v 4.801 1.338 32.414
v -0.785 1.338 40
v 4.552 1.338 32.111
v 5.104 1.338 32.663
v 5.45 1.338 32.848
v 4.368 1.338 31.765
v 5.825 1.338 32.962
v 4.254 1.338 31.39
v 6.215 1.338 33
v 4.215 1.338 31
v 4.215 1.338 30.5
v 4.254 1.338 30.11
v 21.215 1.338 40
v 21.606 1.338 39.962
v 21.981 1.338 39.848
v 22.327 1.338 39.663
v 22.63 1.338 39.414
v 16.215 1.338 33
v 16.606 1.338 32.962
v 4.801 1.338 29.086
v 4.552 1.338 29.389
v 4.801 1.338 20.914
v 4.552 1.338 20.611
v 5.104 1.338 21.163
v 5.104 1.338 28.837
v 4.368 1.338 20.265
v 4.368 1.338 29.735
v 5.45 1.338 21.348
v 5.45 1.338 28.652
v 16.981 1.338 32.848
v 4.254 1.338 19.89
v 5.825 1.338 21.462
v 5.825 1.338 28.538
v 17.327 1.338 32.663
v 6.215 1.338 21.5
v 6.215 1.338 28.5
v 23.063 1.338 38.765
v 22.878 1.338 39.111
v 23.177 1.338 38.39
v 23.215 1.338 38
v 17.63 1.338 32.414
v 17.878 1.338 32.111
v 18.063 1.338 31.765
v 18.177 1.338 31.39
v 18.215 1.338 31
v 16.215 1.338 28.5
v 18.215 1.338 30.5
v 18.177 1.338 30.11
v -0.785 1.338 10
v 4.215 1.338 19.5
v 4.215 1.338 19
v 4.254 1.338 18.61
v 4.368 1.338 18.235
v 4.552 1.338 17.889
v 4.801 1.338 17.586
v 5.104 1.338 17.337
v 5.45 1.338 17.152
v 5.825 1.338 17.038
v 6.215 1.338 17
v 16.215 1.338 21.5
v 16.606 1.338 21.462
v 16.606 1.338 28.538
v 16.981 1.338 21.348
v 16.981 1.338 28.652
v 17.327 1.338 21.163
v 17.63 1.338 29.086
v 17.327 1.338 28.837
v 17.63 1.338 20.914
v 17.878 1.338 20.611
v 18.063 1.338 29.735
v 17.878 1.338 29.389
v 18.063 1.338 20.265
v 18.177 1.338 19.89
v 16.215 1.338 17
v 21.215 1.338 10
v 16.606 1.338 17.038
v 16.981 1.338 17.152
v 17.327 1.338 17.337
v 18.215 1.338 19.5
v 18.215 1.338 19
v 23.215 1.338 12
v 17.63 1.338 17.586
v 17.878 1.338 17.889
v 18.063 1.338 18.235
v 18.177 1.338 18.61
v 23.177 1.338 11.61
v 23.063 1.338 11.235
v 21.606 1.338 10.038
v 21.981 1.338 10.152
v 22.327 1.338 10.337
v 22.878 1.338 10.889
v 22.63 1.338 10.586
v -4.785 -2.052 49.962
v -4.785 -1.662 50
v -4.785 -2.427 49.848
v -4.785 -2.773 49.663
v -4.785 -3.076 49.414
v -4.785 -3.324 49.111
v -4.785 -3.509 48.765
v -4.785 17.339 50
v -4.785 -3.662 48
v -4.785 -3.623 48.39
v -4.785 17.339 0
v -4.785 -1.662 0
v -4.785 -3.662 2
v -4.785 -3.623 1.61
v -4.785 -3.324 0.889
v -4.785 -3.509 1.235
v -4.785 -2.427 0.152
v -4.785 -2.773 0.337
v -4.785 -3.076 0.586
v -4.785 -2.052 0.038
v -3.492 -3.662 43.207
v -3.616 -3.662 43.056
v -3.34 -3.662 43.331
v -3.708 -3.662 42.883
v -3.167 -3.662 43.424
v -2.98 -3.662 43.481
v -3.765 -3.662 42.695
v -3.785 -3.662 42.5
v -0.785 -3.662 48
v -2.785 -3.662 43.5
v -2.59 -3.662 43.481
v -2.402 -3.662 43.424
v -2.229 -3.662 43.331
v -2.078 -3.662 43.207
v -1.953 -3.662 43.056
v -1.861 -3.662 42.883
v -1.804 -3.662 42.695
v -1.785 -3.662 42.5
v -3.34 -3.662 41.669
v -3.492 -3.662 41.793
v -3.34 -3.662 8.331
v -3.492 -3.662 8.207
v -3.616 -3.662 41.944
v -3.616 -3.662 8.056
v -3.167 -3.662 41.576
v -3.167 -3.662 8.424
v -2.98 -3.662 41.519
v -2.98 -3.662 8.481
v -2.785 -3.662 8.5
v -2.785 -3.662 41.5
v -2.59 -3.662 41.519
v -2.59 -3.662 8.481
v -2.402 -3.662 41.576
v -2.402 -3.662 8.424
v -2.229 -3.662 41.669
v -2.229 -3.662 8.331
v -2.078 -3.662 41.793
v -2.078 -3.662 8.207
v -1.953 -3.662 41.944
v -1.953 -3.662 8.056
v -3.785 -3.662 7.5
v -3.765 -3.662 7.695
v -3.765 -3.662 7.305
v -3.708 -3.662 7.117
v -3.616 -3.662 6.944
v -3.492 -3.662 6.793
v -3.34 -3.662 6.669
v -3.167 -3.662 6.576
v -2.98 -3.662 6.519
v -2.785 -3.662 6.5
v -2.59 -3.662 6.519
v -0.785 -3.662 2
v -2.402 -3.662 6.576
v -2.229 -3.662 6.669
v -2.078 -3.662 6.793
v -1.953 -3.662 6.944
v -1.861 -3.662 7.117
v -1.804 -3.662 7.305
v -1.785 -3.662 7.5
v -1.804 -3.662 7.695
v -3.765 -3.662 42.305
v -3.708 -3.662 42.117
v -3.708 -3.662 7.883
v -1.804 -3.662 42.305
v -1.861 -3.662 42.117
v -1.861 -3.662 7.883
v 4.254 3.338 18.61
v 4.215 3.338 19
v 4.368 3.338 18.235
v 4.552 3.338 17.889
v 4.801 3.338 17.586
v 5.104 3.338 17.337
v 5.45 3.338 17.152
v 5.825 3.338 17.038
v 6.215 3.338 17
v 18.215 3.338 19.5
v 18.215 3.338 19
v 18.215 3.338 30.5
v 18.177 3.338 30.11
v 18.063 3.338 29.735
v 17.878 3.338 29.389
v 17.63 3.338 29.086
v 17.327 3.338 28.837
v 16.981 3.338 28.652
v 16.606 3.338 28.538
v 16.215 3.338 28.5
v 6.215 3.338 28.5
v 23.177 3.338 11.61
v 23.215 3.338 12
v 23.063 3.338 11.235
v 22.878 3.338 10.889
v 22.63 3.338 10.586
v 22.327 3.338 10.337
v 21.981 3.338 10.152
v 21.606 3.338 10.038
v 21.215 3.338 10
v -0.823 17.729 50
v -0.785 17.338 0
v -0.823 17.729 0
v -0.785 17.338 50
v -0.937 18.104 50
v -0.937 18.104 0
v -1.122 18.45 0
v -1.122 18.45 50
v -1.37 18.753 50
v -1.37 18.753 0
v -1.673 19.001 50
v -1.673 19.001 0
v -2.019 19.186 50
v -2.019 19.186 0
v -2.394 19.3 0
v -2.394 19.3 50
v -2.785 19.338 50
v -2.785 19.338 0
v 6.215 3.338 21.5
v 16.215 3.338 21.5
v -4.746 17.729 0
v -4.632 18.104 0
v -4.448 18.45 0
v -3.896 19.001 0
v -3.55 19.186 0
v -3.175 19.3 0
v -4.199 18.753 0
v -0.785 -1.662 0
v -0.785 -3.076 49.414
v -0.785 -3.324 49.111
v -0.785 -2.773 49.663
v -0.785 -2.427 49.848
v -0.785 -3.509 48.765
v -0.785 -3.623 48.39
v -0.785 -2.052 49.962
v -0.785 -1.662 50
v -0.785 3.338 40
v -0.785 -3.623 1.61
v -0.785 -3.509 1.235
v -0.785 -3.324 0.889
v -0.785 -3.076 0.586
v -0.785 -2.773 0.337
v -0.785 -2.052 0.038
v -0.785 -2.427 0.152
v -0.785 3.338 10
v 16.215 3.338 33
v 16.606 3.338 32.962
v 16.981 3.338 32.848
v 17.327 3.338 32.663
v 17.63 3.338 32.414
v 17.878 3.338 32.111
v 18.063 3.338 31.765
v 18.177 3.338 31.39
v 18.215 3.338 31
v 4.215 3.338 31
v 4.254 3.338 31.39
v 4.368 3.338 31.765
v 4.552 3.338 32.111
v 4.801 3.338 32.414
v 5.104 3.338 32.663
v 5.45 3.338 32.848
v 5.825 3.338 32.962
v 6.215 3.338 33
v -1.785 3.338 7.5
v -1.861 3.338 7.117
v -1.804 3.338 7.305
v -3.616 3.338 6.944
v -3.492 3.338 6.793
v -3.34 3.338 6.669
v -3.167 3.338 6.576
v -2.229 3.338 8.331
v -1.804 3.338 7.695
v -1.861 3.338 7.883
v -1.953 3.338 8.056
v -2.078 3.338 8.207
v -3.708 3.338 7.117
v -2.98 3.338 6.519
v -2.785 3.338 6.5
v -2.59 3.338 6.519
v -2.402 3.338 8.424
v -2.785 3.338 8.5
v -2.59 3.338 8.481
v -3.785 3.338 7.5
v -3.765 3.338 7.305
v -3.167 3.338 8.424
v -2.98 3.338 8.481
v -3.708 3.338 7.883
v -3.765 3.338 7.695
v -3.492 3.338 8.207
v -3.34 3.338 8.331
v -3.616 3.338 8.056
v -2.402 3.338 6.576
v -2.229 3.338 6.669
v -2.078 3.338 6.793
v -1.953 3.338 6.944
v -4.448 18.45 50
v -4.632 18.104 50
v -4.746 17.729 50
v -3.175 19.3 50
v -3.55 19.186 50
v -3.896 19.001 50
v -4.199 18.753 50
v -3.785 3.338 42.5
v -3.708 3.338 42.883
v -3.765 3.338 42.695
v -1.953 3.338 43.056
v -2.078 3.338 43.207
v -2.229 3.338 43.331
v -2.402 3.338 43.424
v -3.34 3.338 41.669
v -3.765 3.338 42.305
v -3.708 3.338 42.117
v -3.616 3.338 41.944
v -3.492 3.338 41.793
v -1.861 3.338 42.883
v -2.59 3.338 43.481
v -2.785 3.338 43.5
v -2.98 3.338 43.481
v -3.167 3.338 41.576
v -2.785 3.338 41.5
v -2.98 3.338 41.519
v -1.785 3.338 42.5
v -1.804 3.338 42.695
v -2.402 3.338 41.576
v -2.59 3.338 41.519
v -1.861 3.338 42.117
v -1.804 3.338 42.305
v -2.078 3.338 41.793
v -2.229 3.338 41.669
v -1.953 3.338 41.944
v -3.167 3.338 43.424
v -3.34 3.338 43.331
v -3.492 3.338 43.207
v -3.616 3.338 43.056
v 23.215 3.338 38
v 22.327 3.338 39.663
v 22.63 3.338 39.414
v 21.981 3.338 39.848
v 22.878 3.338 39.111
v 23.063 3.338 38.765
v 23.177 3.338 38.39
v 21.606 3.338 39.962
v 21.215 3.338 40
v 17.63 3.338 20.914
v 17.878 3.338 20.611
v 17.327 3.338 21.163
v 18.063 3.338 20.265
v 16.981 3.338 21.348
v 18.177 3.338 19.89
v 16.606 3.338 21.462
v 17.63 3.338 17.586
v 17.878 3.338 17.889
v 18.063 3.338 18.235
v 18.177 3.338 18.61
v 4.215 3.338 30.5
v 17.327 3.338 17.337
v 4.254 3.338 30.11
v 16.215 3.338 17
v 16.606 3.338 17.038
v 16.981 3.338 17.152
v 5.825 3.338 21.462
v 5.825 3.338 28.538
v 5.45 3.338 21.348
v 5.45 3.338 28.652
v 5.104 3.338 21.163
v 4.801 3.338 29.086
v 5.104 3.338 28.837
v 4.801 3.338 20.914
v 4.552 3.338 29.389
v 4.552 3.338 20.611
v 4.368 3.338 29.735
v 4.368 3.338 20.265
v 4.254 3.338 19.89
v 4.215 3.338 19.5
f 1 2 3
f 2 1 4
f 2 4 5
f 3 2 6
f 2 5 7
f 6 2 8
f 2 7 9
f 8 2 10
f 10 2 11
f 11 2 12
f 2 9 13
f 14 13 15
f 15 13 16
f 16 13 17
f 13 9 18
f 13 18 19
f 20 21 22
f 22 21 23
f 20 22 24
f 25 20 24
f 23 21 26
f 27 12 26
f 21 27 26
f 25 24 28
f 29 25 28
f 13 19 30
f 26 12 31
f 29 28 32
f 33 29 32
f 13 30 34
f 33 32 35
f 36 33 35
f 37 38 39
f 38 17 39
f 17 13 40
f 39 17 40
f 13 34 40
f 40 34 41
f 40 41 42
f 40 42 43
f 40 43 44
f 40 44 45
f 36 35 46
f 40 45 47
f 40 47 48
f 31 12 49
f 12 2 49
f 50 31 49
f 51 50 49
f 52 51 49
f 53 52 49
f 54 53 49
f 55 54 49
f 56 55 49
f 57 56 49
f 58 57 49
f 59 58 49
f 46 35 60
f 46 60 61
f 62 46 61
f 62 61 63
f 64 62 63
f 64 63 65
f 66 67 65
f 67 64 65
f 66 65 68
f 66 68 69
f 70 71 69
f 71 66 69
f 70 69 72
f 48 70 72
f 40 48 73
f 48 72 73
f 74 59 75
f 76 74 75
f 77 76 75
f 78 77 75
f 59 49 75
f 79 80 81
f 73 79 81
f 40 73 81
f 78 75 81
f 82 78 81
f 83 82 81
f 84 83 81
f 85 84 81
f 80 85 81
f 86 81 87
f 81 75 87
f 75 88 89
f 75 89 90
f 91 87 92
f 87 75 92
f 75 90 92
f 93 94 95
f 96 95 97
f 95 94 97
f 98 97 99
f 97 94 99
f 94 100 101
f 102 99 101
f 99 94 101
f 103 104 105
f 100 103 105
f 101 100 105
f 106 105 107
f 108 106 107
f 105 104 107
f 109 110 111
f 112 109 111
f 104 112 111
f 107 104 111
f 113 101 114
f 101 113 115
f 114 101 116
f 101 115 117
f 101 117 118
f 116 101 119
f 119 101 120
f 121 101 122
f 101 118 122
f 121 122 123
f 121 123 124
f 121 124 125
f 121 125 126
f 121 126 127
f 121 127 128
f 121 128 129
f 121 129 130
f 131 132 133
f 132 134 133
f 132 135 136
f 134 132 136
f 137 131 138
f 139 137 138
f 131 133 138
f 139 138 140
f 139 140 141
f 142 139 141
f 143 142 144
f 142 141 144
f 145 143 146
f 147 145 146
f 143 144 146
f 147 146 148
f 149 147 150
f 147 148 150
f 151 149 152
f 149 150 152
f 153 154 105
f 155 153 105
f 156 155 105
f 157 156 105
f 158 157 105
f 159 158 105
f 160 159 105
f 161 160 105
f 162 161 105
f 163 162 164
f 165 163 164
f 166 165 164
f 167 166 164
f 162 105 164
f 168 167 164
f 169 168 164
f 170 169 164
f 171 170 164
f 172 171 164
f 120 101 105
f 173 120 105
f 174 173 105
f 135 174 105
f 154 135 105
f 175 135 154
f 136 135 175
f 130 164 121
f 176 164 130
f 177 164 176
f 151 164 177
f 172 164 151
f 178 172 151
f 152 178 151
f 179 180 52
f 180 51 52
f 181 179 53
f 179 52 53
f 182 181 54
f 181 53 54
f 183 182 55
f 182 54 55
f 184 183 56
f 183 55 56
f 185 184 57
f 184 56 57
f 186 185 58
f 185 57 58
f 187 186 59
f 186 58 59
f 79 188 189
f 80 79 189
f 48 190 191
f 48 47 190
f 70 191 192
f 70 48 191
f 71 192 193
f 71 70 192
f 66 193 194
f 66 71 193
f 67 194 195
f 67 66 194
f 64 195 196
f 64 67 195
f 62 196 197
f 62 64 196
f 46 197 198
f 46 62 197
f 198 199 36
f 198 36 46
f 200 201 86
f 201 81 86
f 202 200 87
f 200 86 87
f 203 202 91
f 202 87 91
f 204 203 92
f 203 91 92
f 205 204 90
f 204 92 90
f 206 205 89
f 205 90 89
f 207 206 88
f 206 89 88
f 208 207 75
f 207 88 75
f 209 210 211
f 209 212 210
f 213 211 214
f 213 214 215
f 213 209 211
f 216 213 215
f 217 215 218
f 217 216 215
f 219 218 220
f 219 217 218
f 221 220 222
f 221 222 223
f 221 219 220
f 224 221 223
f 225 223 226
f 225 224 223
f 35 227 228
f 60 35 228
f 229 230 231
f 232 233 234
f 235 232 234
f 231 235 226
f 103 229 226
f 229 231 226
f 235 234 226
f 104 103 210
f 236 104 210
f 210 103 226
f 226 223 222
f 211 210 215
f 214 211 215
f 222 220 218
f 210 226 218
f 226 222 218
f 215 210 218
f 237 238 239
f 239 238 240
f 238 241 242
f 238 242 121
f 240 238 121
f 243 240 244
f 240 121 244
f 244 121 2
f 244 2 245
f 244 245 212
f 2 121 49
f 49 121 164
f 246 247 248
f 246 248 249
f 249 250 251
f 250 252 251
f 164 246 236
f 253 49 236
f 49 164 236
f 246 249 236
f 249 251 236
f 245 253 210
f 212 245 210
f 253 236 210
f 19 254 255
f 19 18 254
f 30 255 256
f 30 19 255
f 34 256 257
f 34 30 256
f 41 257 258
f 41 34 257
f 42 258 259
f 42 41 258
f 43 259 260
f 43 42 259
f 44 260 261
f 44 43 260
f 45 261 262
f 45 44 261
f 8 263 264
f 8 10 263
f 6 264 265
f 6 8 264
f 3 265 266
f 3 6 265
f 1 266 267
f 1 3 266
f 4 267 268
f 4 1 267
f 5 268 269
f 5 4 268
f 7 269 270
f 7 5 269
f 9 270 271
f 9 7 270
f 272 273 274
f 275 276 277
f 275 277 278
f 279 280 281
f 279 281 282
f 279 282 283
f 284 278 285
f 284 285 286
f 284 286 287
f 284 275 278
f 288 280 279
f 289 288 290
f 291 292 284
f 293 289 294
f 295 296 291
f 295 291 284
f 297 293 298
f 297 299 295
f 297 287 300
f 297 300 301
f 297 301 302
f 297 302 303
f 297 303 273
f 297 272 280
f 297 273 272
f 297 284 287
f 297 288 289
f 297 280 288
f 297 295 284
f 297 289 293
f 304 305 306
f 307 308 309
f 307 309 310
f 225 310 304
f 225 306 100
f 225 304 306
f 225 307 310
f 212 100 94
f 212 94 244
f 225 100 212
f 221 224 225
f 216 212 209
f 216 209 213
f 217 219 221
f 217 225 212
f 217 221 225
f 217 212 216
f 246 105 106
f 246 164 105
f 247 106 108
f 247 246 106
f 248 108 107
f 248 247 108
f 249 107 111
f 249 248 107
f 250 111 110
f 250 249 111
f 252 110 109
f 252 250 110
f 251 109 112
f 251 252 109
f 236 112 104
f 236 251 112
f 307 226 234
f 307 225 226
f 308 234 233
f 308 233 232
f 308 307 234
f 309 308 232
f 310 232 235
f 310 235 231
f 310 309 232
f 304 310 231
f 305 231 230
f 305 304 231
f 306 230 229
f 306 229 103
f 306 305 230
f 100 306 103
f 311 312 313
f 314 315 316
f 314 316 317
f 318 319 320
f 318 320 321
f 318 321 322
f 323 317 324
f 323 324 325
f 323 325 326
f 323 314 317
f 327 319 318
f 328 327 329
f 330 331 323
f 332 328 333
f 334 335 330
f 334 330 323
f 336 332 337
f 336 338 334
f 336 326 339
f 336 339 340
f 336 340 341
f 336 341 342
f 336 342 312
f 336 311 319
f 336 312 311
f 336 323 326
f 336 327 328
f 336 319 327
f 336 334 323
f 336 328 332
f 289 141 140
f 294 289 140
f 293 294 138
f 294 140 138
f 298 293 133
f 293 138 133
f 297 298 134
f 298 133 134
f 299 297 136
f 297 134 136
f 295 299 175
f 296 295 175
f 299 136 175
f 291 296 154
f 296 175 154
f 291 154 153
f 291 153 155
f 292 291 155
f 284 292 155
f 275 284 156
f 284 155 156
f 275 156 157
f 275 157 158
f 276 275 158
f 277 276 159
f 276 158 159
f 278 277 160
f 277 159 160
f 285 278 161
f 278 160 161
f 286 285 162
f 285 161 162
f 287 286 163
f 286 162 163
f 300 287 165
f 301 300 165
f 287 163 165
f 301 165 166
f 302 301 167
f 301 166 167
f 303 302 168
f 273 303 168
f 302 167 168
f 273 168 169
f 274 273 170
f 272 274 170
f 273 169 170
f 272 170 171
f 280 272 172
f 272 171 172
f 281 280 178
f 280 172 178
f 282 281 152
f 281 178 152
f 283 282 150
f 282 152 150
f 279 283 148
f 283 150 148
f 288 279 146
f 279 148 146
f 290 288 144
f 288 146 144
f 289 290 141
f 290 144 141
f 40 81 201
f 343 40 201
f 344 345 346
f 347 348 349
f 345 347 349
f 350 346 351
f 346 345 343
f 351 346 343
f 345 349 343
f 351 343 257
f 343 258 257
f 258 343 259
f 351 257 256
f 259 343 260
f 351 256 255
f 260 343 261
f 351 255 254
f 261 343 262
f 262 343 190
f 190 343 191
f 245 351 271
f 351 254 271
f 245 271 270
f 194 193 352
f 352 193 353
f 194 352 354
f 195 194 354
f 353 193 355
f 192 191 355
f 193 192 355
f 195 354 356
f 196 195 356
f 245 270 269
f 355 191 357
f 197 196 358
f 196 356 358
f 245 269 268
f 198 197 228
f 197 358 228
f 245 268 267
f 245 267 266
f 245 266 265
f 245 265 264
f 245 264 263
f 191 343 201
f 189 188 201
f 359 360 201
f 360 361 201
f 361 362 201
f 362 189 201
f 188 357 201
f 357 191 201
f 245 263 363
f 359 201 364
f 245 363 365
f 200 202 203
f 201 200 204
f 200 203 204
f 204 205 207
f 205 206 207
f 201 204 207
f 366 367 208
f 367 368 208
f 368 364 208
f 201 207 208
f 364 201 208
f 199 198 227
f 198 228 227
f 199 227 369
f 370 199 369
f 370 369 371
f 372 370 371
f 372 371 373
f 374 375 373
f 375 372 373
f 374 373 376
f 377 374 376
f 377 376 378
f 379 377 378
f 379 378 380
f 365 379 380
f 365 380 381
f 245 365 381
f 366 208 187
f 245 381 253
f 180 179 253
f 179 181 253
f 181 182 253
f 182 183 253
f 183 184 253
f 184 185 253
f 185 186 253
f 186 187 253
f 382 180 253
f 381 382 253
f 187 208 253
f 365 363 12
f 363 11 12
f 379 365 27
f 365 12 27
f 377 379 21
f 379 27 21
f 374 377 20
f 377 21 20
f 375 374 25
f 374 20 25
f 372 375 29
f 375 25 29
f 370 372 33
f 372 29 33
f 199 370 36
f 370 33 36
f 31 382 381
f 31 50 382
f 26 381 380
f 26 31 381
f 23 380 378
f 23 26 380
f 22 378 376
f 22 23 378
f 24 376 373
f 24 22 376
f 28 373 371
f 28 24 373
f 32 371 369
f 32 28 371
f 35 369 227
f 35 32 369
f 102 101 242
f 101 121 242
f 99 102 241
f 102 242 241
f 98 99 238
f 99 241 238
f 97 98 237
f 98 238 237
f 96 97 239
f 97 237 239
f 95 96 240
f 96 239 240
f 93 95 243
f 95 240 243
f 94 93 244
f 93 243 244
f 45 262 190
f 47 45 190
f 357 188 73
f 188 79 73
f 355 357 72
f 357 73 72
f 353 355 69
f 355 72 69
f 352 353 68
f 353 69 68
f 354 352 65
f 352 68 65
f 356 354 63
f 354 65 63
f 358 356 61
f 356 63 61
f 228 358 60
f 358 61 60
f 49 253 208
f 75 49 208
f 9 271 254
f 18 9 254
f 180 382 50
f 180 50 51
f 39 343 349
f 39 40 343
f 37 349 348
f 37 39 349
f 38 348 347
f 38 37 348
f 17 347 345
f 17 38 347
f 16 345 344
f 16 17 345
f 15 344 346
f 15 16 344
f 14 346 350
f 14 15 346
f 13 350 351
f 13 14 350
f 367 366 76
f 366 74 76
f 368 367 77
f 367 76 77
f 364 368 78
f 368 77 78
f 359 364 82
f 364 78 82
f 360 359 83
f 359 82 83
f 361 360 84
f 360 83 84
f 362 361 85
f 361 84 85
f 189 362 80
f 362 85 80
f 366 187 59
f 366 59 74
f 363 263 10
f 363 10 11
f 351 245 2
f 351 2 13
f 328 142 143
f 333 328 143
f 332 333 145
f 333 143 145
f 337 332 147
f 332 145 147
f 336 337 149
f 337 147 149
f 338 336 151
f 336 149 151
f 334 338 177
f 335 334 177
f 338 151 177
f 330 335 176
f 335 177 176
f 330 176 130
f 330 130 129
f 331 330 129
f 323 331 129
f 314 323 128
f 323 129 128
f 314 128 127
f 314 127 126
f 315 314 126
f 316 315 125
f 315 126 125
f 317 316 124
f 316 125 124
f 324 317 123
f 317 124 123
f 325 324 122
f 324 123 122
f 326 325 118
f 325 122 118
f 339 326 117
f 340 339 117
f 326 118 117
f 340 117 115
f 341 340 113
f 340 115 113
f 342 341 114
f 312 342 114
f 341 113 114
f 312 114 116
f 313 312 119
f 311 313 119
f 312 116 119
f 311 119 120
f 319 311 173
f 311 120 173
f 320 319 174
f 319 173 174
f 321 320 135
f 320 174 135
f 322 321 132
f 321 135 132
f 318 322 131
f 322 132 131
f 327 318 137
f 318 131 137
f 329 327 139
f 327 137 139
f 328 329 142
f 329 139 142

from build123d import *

# Parameters (mm, degrees)
EXTRUDE_1_DEPTH     = 50
SKETCH_2_W          = 24
SKETCH_2_H          = 10
SKETCH_2_W_2        = 14
SKETCH_2_H_2        = 4.5
CUT_EXTRUDE_1_DEPTH = 50
FILLET_1_R          = 2
FILLET_2_R          = 2
FILLET_3_R          = 2
FILLET_4_R          = 2
FILLET_5_R          = 2
FILLET_6_R          = 2
FILLET_7_R          = 2
FILLET_8_R          = 2
FILLET_9_R          = 2
FILLET_10_R         = 2
FILLET_11_R         = 2
FILLET_12_R         = 2
FILLET_14_R         = 2
FILLET_15_R         = 2
SKETCH_3_R          = 1
CUT_EXTRUDE_2_DEPTH = 7


with BuildPart() as part:
    # 草图1 → 凸台-拉伸1 (new body)
    with BuildSketch(Plane.XY):
        Polygon((-4.784615385, 19.338461538), (-4.784615385, -3.661538462), (-0.784615385, -3.661538462), (-0.784615385, 1.338461538), (23.215384615, 1.338461538), (23.215384615, 3.338461538), (-0.784615385, 3.338461538), (-0.784615385, 19.338461538), align=None)
    extrude(amount=EXTRUDE_1_DEPTH)

    # 草图2 → 切除-拉伸1 (cut)
    with BuildSketch(Plane(origin=(0, 3.338461538, 0), x_dir=(1, 0, 0), z_dir=(0, 1, 0))):
        with Locations((11.215384615, -45)):
            Rectangle(SKETCH_2_W, SKETCH_2_H)
        with Locations((11.215384615, -30.75)):
            Rectangle(SKETCH_2_W_2, SKETCH_2_H_2)
        with Locations((11.215384615, -19.25)):
            Rectangle(SKETCH_2_W_2, SKETCH_2_H_2)
        with Locations((11.215384615, -5)):
            Rectangle(SKETCH_2_W, SKETCH_2_H)
    extrude(amount=-CUT_EXTRUDE_1_DEPTH, mode=Mode.SUBTRACT)

    # 圆角1
    fillet_1_edges = [part.edges().sort_by_distance(p)[0] for p in [
        (23.215384615, 2.338461538, 40),
    ]]
    fillet(fillet_1_edges, radius=FILLET_1_R)

    # 圆角2
    fillet_2_edges = [part.edges().sort_by_distance(p)[0] for p in [
        (23.215384615, 2.338461538, 10),
    ]]
    fillet(fillet_2_edges, radius=FILLET_2_R)

    # 圆角3
    fillet_3_edges = [part.edges().sort_by_distance(p)[0] for p in [
        (4.215384615, 2.338461538, 28.5),
    ]]
    fillet(fillet_3_edges, radius=FILLET_3_R)

    # 圆角4
    fillet_4_edges = [part.edges().sort_by_distance(p)[0] for p in [
        (4.215384615, 2.338461538, 33),
    ]]
    fillet(fillet_4_edges, radius=FILLET_4_R)

    # 圆角5
    fillet_5_edges = [part.edges().sort_by_distance(p)[0] for p in [
        (4.215384615, 2.338461538, 17),
    ]]
    fillet(fillet_5_edges, radius=FILLET_5_R)

    # 圆角6
    fillet_6_edges = [part.edges().sort_by_distance(p)[0] for p in [
        (4.215384615, 2.338461538, 21.5),
    ]]
    fillet(fillet_6_edges, radius=FILLET_6_R)

    # 圆角7
    fillet_7_edges = [part.edges().sort_by_distance(p)[0] for p in [
        (18.215384615, 2.338461538, 17),
    ]]
    fillet(fillet_7_edges, radius=FILLET_7_R)

    # 圆角8
    fillet_8_edges = [part.edges().sort_by_distance(p)[0] for p in [
        (18.215384615, 2.338461538, 33),
    ]]
    fillet(fillet_8_edges, radius=FILLET_8_R)

    # 圆角9
    fillet_9_edges = [part.edges().sort_by_distance(p)[0] for p in [
        (18.215384615, 2.338461538, 28.5),
    ]]
    fillet(fillet_9_edges, radius=FILLET_9_R)

    # 圆角10
    fillet_10_edges = [part.edges().sort_by_distance(p)[0] for p in [
        (18.215384615, 2.338461538, 21.5),
    ]]
    fillet(fillet_10_edges, radius=FILLET_10_R)

    # 圆角11
    fillet_11_edges = [part.edges().sort_by_distance(p)[0] for p in [
        (-0.784615385, 19.338461538, 25),
    ]]
    fillet(fillet_11_edges, radius=FILLET_11_R)

    # 圆角12
    fillet_12_edges = [part.edges().sort_by_distance(p)[0] for p in [
        (-4.784615385, 19.338461538, 25),
    ]]
    fillet(fillet_12_edges, radius=FILLET_12_R - 0.0001)  # a hair under: the kernel refuses the full size

    # 圆角14
    fillet_14_edges = [part.edges().sort_by_distance(p)[0] for p in [
        (-2.784615385, -3.661538462, 50),
    ]]
    fillet(fillet_14_edges, radius=FILLET_14_R)

    # 圆角15
    fillet_15_edges = [part.edges().sort_by_distance(p)[0] for p in [
        (-2.784615385, -3.661538462, 0),
    ]]
    fillet(fillet_15_edges, radius=FILLET_15_R)

    # 草图3 → 切除-拉伸2 (cut)
    with BuildSketch(Plane.XZ.offset(3.661538462)):
        with Locations(Location((-2.784615385, 42.5, 0), (0, 0, 270))):
            Circle(SKETCH_3_R)
        with Locations(Location((-2.784615385, 7.5, 0), (0, 0, 90))):
            Circle(SKETCH_3_R)
    extrude(amount=-CUT_EXTRUDE_2_DEPTH, mode=Mode.SUBTRACT)


solid = part.part
